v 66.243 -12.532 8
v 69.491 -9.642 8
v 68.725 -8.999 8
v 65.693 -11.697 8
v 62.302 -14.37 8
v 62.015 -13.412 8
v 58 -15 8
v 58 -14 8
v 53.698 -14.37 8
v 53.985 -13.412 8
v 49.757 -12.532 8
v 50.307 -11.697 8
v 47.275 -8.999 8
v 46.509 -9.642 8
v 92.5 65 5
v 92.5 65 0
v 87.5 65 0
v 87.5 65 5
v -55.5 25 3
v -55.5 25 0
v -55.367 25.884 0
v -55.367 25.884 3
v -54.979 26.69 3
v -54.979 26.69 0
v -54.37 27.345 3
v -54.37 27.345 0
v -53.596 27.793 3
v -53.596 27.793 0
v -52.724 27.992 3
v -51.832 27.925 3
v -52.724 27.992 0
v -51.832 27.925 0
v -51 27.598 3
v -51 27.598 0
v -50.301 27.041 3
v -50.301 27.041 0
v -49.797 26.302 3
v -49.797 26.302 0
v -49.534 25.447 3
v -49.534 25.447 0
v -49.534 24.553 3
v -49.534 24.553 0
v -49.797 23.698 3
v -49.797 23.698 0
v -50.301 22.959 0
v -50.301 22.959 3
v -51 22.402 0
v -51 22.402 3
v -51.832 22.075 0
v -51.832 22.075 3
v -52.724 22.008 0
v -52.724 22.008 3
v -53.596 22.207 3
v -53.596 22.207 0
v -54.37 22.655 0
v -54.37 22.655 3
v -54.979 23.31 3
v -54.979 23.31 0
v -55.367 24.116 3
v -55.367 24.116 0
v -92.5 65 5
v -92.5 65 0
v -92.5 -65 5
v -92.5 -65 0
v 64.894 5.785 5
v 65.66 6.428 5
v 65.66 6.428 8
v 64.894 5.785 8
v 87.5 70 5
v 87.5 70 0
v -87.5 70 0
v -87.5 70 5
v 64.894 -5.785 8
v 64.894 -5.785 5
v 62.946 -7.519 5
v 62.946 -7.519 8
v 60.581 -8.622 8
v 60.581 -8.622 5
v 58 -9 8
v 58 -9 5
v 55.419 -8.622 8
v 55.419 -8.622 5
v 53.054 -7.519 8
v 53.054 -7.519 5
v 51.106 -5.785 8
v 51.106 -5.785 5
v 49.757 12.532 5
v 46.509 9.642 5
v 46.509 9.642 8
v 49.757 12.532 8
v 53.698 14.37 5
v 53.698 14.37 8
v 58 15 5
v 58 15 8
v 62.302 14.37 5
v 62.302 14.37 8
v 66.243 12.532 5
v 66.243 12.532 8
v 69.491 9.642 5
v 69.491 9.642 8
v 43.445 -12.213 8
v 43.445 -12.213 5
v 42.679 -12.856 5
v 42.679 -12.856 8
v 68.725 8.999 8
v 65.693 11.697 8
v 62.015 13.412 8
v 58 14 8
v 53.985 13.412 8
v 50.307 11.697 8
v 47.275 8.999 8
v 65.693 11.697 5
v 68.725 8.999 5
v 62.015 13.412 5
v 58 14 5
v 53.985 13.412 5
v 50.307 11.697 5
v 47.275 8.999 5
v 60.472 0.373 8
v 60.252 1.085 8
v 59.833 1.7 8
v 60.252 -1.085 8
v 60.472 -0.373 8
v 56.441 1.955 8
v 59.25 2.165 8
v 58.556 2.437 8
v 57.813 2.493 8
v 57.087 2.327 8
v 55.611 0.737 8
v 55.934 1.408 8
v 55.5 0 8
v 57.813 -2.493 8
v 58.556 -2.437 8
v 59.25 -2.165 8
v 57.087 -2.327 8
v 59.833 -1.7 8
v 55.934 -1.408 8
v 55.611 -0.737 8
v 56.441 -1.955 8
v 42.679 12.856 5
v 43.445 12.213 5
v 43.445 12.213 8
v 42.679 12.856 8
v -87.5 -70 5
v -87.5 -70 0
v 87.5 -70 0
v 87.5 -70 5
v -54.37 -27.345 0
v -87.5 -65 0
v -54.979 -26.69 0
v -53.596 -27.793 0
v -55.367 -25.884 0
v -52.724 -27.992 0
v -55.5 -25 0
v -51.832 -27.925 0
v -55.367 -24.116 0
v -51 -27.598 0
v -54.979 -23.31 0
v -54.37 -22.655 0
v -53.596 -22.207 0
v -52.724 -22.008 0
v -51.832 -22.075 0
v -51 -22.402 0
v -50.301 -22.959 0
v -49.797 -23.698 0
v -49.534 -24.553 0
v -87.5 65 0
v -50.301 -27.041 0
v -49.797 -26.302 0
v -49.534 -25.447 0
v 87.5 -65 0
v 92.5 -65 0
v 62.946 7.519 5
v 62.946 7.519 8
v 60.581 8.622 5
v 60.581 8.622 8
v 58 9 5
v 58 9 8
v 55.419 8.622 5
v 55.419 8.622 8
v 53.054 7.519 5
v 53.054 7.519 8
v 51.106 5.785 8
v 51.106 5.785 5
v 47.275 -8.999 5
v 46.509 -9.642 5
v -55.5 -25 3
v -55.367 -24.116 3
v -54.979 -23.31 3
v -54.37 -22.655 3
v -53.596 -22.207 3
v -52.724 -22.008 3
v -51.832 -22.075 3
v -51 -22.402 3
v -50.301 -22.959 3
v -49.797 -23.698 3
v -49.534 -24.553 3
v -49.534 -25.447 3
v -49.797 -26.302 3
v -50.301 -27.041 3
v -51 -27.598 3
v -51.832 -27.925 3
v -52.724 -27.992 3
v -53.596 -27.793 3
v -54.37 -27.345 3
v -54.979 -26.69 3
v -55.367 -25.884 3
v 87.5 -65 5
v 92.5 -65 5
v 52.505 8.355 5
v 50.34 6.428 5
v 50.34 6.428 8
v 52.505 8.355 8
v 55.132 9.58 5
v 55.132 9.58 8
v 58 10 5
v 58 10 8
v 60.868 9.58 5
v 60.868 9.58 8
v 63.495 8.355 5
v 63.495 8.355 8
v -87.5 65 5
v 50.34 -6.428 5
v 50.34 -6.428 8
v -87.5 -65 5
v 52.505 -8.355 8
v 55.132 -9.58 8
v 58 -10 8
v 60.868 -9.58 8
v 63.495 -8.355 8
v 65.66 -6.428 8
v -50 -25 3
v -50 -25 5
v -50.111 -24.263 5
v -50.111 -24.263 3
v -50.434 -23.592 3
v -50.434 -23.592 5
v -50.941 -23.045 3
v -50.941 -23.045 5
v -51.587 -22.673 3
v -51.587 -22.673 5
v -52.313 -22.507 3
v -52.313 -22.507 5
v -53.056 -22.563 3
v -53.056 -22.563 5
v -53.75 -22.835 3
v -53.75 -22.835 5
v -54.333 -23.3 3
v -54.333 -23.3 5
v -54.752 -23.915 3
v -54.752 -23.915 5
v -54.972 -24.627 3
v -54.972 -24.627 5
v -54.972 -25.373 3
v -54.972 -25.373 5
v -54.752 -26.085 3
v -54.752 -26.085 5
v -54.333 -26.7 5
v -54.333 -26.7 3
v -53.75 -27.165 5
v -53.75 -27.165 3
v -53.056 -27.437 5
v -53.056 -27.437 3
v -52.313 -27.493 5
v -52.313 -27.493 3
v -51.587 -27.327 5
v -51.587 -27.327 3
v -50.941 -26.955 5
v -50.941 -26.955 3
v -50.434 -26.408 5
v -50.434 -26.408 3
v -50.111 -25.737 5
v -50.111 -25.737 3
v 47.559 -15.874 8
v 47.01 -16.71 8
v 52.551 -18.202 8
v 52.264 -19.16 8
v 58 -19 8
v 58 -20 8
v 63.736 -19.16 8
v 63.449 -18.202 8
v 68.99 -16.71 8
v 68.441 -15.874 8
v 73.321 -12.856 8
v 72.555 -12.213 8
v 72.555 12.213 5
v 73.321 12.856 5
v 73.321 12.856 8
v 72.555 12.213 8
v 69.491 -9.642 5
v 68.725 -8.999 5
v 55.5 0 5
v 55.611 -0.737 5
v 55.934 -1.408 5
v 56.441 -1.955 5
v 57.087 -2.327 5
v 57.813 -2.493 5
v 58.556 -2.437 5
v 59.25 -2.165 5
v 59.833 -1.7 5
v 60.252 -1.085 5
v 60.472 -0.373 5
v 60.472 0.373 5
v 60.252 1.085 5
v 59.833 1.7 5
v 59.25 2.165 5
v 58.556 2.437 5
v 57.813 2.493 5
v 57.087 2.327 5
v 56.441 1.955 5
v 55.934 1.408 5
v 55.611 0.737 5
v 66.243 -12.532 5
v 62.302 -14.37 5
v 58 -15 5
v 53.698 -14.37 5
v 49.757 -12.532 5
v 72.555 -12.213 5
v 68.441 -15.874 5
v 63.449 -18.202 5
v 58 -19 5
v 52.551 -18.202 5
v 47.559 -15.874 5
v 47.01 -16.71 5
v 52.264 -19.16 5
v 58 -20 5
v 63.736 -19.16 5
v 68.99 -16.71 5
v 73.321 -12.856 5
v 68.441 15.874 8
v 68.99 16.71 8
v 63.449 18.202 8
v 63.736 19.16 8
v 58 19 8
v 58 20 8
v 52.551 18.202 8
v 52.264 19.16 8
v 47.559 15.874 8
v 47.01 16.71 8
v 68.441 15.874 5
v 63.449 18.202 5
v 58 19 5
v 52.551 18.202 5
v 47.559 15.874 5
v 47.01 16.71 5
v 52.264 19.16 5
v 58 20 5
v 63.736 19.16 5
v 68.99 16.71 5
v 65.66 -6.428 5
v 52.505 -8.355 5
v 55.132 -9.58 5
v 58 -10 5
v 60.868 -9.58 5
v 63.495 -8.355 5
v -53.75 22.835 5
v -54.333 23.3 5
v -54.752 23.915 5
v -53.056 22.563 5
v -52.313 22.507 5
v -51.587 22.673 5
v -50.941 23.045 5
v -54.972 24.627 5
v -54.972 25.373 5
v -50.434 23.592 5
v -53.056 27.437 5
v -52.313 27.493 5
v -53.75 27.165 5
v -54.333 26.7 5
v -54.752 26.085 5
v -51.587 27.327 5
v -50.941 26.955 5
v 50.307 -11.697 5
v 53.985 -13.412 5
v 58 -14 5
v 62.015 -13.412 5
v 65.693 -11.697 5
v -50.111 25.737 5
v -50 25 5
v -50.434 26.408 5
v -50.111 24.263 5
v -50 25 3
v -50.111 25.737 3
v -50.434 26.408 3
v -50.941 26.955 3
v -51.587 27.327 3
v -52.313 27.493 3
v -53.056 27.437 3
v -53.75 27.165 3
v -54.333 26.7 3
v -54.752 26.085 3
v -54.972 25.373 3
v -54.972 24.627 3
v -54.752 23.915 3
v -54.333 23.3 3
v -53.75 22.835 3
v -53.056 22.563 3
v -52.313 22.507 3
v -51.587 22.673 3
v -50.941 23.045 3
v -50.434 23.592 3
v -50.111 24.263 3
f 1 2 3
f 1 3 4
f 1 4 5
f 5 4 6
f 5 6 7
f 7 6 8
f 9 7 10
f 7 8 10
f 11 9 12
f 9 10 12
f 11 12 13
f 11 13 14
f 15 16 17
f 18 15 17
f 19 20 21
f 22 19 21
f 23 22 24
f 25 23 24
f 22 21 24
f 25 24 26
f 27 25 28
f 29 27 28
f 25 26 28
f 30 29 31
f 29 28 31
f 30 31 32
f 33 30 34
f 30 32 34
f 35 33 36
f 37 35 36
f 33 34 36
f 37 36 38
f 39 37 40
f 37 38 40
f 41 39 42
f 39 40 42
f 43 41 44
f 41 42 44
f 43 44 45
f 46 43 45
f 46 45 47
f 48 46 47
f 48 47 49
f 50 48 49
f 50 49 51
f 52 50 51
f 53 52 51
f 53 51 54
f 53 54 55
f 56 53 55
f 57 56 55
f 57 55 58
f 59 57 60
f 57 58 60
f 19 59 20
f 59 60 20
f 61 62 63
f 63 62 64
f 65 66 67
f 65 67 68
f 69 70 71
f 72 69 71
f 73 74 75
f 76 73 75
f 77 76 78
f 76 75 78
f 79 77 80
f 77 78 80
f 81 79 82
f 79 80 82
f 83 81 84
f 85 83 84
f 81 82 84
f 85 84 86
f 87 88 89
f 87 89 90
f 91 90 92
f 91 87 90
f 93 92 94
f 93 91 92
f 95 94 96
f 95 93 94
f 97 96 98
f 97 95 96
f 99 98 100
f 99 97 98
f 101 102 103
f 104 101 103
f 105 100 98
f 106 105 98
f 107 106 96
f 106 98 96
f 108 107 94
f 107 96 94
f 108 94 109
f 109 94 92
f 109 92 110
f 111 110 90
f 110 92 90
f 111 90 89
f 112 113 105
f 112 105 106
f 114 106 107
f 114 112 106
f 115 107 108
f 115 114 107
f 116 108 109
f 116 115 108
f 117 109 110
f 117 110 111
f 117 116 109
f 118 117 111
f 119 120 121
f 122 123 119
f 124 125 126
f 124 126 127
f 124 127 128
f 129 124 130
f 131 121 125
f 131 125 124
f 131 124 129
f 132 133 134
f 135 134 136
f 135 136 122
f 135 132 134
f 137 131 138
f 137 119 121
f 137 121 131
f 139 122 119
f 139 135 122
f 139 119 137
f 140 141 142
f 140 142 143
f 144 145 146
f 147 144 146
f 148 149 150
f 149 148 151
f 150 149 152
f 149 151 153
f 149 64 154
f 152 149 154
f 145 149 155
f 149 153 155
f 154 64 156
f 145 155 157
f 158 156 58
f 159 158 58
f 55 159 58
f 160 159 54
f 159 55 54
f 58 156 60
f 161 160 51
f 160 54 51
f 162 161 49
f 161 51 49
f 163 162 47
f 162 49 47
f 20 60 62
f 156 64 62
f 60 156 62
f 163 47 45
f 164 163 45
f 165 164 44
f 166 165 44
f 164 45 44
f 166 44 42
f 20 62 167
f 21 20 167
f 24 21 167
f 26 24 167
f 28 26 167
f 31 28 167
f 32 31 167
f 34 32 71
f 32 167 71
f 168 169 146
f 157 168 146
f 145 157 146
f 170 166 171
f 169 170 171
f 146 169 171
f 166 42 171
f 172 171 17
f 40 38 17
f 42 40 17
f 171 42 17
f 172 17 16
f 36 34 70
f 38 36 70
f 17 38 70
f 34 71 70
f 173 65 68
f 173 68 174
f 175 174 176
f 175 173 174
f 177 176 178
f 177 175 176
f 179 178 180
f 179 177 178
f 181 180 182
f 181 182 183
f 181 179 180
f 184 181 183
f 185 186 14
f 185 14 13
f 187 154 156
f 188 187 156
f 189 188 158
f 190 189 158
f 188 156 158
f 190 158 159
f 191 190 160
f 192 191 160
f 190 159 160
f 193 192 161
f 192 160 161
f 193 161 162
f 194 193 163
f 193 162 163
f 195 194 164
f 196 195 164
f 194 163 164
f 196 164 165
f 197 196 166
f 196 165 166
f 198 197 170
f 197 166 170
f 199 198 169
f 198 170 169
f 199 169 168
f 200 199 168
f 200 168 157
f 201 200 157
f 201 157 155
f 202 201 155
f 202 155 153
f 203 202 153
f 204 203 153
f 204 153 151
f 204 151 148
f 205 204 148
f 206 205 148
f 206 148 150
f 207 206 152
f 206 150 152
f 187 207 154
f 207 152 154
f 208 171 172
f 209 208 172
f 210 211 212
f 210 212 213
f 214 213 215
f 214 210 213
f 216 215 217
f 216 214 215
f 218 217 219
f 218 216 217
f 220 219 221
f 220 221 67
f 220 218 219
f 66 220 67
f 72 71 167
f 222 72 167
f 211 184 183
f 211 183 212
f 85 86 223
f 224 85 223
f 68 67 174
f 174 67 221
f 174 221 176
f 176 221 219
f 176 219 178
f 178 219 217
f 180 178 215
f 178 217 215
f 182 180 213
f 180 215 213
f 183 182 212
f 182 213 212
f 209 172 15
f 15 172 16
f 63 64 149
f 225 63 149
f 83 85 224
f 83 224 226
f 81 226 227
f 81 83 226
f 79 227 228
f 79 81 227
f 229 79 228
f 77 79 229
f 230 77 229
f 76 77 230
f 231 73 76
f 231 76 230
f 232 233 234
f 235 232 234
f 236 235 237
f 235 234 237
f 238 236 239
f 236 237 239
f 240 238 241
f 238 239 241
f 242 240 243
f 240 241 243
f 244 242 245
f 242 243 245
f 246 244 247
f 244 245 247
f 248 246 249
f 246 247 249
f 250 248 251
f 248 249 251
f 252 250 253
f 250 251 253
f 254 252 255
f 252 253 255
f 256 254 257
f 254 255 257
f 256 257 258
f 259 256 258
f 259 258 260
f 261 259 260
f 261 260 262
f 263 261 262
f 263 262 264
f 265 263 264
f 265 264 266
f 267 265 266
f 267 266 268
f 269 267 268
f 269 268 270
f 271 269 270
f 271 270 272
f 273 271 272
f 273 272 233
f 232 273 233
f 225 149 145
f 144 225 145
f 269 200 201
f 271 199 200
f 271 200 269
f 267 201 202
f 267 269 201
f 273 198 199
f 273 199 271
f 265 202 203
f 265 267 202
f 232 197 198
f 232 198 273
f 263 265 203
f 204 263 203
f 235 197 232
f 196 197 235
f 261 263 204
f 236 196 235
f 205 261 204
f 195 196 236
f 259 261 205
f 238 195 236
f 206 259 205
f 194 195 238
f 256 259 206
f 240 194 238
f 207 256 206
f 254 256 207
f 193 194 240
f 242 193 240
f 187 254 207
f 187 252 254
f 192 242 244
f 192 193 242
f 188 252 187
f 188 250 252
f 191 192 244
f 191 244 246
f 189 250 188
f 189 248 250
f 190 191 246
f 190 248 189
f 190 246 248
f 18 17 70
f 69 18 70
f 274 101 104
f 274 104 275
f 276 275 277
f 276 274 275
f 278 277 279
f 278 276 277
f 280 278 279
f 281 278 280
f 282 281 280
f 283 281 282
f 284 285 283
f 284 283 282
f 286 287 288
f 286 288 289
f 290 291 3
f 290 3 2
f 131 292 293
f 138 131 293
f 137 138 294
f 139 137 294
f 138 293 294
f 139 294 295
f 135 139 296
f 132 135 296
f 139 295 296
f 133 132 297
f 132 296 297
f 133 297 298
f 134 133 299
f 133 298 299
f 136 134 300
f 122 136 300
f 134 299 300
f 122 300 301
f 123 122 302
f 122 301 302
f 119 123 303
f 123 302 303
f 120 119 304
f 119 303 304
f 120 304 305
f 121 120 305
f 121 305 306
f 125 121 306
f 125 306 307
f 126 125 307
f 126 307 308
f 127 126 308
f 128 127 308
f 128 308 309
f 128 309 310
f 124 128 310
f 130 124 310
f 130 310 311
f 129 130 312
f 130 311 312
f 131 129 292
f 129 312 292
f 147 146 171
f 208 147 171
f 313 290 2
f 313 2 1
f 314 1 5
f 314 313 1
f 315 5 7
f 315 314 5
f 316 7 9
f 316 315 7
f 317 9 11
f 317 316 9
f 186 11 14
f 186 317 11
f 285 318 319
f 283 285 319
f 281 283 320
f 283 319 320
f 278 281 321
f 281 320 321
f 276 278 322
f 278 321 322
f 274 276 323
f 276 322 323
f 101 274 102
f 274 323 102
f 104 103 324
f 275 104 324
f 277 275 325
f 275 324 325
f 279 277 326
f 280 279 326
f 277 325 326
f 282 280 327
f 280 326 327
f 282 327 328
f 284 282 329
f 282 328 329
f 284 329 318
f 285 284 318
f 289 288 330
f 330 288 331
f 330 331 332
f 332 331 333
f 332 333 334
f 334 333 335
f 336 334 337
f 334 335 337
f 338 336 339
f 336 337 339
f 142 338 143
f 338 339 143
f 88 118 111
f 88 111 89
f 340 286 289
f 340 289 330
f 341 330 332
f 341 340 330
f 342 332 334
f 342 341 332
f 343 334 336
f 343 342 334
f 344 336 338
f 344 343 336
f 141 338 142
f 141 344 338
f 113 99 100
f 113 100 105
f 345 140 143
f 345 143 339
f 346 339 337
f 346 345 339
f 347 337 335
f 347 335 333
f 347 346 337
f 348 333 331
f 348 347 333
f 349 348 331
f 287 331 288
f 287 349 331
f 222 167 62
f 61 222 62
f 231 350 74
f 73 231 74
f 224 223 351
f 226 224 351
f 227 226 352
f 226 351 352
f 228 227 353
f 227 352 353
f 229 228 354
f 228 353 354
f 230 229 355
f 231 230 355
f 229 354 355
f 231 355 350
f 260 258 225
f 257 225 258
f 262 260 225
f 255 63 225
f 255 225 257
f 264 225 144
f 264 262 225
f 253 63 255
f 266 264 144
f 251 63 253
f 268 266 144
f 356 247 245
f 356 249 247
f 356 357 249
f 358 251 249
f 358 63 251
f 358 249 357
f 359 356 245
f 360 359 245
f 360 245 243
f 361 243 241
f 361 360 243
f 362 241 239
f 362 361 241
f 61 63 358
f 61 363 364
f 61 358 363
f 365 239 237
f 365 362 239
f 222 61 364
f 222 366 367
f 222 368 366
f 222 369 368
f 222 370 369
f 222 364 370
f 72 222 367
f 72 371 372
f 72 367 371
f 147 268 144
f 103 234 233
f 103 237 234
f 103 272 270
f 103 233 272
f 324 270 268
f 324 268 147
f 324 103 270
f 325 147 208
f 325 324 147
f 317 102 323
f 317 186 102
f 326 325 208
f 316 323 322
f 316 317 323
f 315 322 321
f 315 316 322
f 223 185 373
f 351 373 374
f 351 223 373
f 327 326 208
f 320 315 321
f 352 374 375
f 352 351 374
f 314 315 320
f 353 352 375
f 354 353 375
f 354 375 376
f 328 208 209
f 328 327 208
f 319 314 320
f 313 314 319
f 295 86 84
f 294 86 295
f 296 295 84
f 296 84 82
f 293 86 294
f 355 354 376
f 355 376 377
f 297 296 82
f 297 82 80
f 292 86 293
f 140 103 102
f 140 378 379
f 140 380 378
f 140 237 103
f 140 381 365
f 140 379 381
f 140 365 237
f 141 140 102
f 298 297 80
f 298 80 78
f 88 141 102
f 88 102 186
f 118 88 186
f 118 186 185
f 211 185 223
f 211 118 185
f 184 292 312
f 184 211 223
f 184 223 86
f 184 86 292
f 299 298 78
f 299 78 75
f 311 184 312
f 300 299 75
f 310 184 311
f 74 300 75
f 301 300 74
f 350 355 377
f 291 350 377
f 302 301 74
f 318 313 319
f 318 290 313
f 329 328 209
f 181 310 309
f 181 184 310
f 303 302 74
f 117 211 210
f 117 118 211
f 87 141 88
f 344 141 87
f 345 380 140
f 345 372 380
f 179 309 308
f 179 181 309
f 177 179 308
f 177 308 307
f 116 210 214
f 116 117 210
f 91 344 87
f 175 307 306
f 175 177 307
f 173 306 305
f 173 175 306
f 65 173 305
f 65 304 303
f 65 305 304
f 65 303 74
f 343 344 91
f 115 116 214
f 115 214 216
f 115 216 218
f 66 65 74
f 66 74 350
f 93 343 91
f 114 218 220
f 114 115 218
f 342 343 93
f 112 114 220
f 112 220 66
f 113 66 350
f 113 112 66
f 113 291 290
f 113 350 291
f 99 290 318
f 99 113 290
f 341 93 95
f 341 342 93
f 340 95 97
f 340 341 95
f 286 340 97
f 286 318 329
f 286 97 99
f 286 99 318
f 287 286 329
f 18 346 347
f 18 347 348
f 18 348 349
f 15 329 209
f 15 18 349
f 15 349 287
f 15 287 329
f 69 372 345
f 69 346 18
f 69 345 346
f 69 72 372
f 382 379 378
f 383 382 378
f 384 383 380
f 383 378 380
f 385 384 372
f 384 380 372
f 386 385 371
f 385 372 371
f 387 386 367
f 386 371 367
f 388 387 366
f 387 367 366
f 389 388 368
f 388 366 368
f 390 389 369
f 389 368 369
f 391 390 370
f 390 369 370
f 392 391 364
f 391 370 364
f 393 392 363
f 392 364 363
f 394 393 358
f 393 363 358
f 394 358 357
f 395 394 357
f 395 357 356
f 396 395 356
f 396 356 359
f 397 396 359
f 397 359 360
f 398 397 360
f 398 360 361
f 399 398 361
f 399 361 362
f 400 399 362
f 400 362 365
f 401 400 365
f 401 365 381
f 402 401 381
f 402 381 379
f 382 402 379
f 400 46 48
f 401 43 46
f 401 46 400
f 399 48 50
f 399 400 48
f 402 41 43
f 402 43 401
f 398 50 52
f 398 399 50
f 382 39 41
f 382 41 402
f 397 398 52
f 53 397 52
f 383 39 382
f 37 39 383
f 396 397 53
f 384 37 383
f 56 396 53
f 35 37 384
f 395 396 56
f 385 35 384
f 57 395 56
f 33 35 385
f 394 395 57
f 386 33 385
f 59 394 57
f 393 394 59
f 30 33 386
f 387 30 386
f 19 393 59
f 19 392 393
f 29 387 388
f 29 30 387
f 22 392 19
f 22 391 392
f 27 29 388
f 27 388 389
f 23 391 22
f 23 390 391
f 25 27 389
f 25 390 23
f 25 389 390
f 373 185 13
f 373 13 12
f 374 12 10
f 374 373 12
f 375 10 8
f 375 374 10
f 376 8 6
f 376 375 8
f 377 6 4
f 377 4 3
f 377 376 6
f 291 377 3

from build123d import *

# Parameters (mm, degrees)
BOSS_EXTRUDE1_DEPTH = 5
SKETCH2_R           = 2.5
CUT_EXTRUDE1_DEPTH  = 5
SKETCH3_R           = 3
CUT_EXTRUDE2_DEPTH  = 3
SKETCH4_R           = 2.5
BOSS_EXTRUDE2_DEPTH = 3


with BuildPart() as part:
    # Sketch1 → Boss-Extrude1 (new body)
    with BuildSketch(Plane.XY):
        Polygon((-87.5, 70), (-87.5, 65), (-92.5, 65), (-92.5, -65), (-87.5, -65), (-87.5, -70), (87.5, -70), (87.5, -65), (92.5, -65), (92.5, 65), (87.5, 65), (87.5, 70), align=None)
    extrude(amount=BOSS_EXTRUDE1_DEPTH)

    # Sketch2 → Cut-Extrude1 (cut)
    with BuildSketch(Plane.XY.offset(5)):
        with Locations((-52.5, -25)):
            Circle(SKETCH2_R)
        with Locations((-52.5, 25)):
            Circle(SKETCH2_R)
    extrude(amount=-CUT_EXTRUDE1_DEPTH, mode=Mode.SUBTRACT)

    # Sketch3 → Cut-Extrude2 (cut)
    with BuildSketch(Plane(origin=(0, 0, 0), x_dir=(-1, 0, 0), z_dir=(0, 0, -1))):
        with Locations((52.5, 25)):
            Circle(SKETCH3_R)
        with Locations((52.5, -25)):
            Circle(SKETCH3_R)
    extrude(amount=-CUT_EXTRUDE2_DEPTH, mode=Mode.SUBTRACT)

    # Sketch4 → Boss-Extrude2 (add)
    with BuildSketch(Plane.XY.offset(5)):
        with Locations(Location((58, 0, 0), (0, 0, 180))):
            Circle(SKETCH4_R)
        with BuildLine():
            Line((51.105600012, -5.785088487), (50.339555569, -6.427876097))
            ThreePointArc((50.339555569, -6.427876097), (58, -10), (65.660444431, -6.427876097))
            Line((65.660444431, -6.427876097), (64.894399988, -5.785088487))
            ThreePointArc((64.894399988, -5.785088487), (58, -9), (51.105600012, -5.785088487))
        make_face()
        with BuildLine():
            Line((68.724622204, -8.999026536), (69.490666647, -9.641814145))
            ThreePointArc((69.490666647, -9.641814145), (58, -15), (46.509333353, -9.641814145))
            Line((46.509333353, -9.641814145), (47.275377796, -8.999026536))
            ThreePointArc((47.275377796, -8.999026536), (58, -14), (68.724622204, -8.999026536))
        make_face()
        with BuildLine():
            Line((43.445155581, 12.212964584), (42.679111138, 12.855752194))
            ThreePointArc((42.679111138, 12.855752194), (58, 20), (73.320888862, 12.855752194))
            Line((73.320888862, 12.855752194), (72.554844419, 12.212964584))
            ThreePointArc((72.554844419, 12.212964584), (58, 19), (43.445155581, 12.212964584))
        make_face()
        with BuildLine():
            Line((47.275377796, 8.999026536), (46.509333353, 9.641814145))
            ThreePointArc((46.509333353, 9.641814145), (58, 15), (69.490666647, 9.641814145))
            Line((69.490666647, 9.641814145), (68.724622204, 8.999026536))
            ThreePointArc((68.724622204, 8.999026536), (58, 14), (47.275377796, 8.999026536))
        make_face()
        with BuildLine():
            Line((51.105600012, 5.785088487), (50.339555569, 6.427876097))
            ThreePointArc((50.339555569, 6.427876097), (58, 10), (65.660444431, 6.427876097))
            Line((65.660444431, 6.427876097), (64.894399988, 5.785088487))
            ThreePointArc((64.894399988, 5.785088487), (58, 9), (51.105600012, 5.785088487))
        make_face()
        with BuildLine():
            Line((43.445155581, -12.212964584), (42.679111138, -12.855752194))
            ThreePointArc((42.679111138, -12.855752194), (58, -20), (73.320888862, -12.855752194))
            Line((73.320888862, -12.855752194), (72.554844419, -12.212964584))
            ThreePointArc((72.554844419, -12.212964584), (58, -19), (43.445155581, -12.212964584))
        make_face()
    extrude(amount=BOSS_EXTRUDE2_DEPTH)


solid = part.part
